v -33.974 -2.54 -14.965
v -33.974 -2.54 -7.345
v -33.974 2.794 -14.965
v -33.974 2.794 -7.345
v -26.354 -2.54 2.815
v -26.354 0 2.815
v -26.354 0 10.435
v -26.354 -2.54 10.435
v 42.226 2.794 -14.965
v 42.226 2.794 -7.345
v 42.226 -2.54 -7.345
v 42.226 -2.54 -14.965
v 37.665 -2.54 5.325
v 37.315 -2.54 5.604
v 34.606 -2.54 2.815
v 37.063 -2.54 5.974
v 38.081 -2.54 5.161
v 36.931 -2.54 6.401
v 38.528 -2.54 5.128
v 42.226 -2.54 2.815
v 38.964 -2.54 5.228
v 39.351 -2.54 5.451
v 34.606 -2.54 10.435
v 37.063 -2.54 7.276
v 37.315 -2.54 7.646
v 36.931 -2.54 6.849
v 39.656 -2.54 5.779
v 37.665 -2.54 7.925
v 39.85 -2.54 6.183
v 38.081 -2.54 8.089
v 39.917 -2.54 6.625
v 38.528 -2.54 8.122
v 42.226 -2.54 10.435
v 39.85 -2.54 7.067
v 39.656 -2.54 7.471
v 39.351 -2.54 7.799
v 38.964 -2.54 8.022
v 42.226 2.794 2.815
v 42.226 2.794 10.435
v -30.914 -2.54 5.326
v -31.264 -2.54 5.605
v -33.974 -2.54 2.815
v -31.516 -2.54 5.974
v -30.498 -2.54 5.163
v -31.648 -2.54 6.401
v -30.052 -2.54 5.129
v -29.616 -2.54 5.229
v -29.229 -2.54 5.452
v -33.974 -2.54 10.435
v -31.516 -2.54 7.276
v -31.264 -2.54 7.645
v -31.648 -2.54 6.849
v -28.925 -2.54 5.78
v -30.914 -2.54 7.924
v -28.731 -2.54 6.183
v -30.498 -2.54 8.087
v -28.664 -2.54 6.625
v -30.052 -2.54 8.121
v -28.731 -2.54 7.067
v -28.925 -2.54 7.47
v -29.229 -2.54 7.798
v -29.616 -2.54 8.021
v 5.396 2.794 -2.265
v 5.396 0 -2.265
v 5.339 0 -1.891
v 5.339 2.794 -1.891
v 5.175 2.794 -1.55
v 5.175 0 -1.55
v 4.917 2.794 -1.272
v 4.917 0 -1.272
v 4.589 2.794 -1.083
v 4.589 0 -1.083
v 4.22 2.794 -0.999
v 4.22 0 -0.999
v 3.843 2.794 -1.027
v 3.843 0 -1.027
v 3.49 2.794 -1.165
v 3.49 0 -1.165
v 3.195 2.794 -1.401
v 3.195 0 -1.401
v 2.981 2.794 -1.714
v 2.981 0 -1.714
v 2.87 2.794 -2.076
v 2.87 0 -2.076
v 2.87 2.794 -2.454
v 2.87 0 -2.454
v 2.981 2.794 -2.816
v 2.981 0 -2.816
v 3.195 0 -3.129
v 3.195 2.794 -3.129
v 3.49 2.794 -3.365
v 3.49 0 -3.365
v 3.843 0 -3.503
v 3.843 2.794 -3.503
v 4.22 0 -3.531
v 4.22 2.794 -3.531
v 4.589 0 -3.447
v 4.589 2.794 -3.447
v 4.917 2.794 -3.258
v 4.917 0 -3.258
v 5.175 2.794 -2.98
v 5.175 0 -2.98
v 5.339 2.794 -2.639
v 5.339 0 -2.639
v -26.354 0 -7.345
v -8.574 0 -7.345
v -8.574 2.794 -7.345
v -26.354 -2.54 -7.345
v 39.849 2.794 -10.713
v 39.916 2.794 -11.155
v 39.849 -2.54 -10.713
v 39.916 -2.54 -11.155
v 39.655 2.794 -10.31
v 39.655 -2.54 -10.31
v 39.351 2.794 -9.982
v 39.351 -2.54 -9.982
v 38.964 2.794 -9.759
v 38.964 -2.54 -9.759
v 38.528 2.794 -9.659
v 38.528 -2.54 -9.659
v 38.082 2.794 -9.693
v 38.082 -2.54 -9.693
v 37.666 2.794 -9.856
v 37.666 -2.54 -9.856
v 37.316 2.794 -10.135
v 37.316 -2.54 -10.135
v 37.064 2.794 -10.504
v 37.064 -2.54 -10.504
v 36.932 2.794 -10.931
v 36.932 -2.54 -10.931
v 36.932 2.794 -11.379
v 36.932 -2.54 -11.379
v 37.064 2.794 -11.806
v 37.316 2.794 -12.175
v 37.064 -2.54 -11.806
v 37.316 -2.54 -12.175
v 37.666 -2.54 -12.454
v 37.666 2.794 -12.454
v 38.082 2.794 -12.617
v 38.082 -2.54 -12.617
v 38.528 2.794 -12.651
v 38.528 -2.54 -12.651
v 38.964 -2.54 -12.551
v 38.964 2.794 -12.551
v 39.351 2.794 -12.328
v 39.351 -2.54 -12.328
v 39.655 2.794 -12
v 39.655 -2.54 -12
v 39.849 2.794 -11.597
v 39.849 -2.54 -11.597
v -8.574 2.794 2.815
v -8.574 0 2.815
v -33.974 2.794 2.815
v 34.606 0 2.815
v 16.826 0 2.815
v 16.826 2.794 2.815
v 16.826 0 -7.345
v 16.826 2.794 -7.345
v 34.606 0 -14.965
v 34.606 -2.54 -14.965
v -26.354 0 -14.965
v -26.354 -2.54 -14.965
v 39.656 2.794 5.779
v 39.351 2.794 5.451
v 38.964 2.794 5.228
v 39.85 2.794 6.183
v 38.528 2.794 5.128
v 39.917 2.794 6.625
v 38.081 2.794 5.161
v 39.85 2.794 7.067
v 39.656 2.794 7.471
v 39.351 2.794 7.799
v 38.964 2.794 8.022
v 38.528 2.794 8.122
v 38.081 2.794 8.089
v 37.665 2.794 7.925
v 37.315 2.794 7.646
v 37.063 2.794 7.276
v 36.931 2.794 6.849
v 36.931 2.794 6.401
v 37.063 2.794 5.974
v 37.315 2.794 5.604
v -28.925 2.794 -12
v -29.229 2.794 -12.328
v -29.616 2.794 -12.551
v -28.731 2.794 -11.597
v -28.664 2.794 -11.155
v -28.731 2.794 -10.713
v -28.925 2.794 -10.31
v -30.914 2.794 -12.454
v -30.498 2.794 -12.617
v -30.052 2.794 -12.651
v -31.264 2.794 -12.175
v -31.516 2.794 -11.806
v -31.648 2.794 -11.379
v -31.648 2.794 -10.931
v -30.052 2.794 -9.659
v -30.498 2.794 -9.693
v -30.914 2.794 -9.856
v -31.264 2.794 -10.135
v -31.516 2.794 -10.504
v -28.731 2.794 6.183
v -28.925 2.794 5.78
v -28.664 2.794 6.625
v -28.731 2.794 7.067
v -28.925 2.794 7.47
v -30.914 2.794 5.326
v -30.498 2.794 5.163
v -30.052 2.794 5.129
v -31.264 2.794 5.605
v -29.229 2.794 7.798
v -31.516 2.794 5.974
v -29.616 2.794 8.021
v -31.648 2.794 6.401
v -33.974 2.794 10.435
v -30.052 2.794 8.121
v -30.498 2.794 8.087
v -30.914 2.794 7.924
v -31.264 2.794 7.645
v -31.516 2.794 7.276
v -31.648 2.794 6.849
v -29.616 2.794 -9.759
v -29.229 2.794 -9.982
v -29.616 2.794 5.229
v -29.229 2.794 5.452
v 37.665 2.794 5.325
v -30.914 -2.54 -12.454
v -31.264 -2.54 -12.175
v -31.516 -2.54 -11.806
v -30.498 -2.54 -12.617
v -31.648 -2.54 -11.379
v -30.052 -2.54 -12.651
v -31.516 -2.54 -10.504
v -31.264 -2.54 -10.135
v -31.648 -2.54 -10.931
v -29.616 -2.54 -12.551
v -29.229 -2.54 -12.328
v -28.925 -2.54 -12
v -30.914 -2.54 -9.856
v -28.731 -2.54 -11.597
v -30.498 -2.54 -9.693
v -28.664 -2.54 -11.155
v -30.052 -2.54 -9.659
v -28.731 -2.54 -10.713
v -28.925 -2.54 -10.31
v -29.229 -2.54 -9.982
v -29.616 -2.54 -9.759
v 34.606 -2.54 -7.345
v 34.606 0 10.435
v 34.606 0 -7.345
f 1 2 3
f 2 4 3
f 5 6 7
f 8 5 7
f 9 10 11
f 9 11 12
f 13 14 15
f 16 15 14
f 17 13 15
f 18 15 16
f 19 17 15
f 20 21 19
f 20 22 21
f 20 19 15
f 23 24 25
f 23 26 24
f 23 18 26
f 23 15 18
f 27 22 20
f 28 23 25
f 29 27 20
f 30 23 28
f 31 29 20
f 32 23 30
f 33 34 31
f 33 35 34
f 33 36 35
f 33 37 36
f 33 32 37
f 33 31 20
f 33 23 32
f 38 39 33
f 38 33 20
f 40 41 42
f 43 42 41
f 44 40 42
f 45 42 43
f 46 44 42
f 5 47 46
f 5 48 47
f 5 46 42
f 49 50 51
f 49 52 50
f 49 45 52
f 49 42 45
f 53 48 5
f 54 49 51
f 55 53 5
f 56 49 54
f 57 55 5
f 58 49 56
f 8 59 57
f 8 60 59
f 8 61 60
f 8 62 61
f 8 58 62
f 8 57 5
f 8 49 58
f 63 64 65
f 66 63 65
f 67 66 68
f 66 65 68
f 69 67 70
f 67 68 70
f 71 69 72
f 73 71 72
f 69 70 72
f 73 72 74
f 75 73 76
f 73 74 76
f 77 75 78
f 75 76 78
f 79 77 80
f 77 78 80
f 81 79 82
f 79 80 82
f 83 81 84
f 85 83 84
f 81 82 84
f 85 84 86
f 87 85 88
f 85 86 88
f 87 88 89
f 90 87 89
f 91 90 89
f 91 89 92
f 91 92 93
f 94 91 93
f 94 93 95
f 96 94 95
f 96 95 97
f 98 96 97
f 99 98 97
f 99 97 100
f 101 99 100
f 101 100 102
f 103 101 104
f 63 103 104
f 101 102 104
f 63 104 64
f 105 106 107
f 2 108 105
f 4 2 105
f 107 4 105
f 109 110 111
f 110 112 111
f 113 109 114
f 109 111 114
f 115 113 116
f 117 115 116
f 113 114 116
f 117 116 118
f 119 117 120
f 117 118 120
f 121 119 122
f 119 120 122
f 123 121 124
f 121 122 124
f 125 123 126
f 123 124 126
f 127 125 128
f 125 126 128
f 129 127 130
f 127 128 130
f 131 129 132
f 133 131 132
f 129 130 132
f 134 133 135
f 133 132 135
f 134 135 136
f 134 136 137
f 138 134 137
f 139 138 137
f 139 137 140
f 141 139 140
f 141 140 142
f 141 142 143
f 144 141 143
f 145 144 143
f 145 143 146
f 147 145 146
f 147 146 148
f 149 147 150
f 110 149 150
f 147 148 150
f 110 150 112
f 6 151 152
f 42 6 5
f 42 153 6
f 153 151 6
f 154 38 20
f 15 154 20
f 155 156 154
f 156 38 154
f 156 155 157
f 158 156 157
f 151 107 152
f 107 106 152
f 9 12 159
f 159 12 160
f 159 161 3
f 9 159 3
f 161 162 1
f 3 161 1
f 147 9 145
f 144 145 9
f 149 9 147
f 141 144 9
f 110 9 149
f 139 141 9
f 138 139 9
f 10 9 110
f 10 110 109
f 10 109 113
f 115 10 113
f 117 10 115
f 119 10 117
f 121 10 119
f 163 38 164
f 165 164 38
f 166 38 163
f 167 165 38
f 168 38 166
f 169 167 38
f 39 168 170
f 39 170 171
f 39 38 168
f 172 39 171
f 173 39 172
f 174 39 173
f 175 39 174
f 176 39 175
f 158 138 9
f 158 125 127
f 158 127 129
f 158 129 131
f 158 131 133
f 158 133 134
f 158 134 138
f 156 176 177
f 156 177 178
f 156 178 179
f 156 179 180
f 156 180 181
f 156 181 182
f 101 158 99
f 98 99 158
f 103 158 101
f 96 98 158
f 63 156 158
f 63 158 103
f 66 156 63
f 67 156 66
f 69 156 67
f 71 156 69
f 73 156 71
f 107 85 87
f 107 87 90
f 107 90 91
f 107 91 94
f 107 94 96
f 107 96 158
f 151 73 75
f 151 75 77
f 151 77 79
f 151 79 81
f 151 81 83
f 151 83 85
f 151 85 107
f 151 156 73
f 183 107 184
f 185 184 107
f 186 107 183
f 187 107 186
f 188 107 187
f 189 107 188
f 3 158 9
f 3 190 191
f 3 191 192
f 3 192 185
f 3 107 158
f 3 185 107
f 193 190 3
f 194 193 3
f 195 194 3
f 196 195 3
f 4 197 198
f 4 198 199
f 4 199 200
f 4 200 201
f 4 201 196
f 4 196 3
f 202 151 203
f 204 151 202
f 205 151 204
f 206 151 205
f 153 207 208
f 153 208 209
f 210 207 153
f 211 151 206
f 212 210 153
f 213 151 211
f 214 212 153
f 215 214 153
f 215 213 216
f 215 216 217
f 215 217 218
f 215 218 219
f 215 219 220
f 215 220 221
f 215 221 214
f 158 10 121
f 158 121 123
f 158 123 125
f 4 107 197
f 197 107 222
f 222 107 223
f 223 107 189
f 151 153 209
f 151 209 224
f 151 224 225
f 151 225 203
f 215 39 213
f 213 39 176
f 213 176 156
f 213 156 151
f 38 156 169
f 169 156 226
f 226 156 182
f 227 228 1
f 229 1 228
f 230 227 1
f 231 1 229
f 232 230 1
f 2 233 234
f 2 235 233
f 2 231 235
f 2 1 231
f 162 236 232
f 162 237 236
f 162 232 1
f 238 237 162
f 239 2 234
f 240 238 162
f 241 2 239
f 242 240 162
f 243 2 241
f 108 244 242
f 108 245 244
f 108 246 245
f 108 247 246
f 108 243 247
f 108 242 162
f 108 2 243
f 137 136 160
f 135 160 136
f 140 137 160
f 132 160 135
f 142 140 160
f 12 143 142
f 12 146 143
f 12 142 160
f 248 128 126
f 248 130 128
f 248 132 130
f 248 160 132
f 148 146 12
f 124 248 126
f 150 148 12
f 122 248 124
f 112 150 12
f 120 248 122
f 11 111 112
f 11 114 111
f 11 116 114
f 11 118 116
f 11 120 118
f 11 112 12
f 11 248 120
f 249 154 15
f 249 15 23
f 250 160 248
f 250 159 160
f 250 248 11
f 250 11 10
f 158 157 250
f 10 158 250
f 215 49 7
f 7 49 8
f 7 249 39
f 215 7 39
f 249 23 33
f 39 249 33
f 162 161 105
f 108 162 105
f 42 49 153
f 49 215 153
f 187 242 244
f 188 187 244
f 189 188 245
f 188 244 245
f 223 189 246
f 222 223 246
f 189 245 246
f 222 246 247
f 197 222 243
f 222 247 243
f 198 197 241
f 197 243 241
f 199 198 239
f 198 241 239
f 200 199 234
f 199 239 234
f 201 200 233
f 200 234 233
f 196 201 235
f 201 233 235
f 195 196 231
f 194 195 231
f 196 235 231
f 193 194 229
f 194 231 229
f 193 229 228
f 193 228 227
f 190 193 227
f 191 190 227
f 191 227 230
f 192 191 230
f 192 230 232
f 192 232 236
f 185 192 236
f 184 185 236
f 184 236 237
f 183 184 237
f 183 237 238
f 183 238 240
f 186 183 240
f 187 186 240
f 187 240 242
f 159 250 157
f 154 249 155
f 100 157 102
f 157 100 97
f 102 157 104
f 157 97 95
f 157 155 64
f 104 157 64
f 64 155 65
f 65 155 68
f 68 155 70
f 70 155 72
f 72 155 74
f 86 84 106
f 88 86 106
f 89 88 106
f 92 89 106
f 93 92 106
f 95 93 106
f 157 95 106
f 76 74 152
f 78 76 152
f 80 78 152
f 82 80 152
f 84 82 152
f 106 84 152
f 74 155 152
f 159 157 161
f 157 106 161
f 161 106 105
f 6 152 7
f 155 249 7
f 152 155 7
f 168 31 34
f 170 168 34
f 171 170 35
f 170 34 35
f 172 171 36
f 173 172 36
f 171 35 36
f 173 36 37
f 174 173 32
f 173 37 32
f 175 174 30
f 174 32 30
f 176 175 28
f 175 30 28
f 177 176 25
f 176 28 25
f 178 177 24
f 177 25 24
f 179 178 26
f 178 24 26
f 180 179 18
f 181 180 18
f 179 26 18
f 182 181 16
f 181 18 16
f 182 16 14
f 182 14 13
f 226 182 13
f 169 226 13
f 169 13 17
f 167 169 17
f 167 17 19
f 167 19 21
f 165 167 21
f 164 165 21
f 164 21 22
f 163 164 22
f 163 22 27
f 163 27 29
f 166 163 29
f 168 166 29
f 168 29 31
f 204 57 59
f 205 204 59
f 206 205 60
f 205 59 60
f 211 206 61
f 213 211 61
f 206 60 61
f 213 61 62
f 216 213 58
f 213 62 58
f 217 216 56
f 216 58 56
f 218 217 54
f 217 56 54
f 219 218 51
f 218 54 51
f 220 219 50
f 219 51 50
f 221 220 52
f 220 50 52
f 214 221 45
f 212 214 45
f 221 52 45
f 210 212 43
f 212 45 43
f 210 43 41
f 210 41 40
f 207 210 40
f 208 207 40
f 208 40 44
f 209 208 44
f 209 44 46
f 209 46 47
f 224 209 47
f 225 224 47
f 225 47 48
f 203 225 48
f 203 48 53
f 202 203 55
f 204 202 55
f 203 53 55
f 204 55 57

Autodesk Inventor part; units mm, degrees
ref_plane "YZ Plane" through (0, 0, 0) normal (1, 0, 0) x (0, 1, 0)
ref_plane "XZ Plane" through (0, 0, 0) normal (0, 1, 0) x (-1, 0, 0)
ref_plane "XY Plane" through (0, 0, 0) normal (0, 0, 1) x (1, 0, 0)
sketch "Sketch1" plane through (0, 0, 0) normal (0, 1, 0) x (-1, 0, 0)
  line L0 (8.5745, -14.965) -> (8.5745, 10.435)
  line L1 (8.5745, 10.435) -> (-16.8255, 10.435)
  line L2 (-16.8255, 10.435) -> (-16.8255, -14.965)
  line L3 (-16.8255, -14.965) -> (8.5745, -14.965)
  point P0 (0, 0)
  dimension "d0" = 25.4
  dimension "d1" = 25.4
extrude "Extrusion1" add sketch "Sketch1" along normal blind 2.794
sketch "Sketch2" plane through (16.8255, 0, 10.435) normal (1, 0, 0) x (0, 0, -1)
  line L0 (25.4, 2.794) -> (0, 2.794) projected
  line L1 (25.4, 0) -> (0, 0) projected
  line L2 (0, 2.794) -> (7.62, 2.794)
  line L3 (7.62, 2.794) -> (7.62, 0)
  line L4 (7.62, 0) -> (0, 0)
  line L5 (0, 0) -> (0, 2.794)
  line L6 (25.4, 0) -> (17.78, 0)
  line L7 (17.78, 0) -> (17.78, 2.794)
  line L8 (17.78, 2.794) -> (25.4, 2.794)
  line L9 (25.4, 2.794) -> (25.4, 0)
  point P0 (10.435, 0)
  dimension "d4" = 7.62
  dimension "d5" = 7.62
extrude "Extrusion2" add sketch "Sketch2" along normal blind 25.4 and the other way blind 50.8 contours L9 L1 L7 L0 | L3 L1 L5 L0
sketch "Sketch3" plane through (0, 0, 0) normal (0, -1, 0) x (1, 0, 0)
  line L0 (16.8255, 2.815) -> (16.8255, -7.345) construction
  line L1 (16.8255, -2.265) -> (-8.5745, -2.265) construction
  line L2 (-8.5745, -7.345) -> (-8.5745, 2.815) construction
  line L3 (42.2255, -14.965) -> (-33.9745, -14.965) construction
  line L4 (4.1255, -14.965) -> (4.1255, 10.435) construction
  line L5 (-33.9745, 10.435) -> (42.2255, 10.435) construction
  circle A0 centre (4.1255, -2.265) radius 1.27
  point P0 (0, 0)
  dimension "d10" = 2.54
extrude "Extrusion3" cut sketch "Sketch3" against normal blind 25.4
sketch "Sketch4" plane through (0, 0, 0) normal (0, -1, 0) x (1, 0, 0)
  line L0 (-33.9745, -14.965) -> (42.2255, -14.965) projected
  line L1 (16.8255, -7.345) -> (42.2255, -7.345) projected
  line L2 (42.2255, -14.965) -> (34.6055, -14.965)
  line L3 (34.6055, -14.965) -> (34.6055, -7.345)
  line L4 (34.6055, -7.345) -> (42.2255, -7.345)
  line L5 (42.2255, -7.345) -> (42.2255, -14.965)
  line L6 (42.2255, 10.435) -> (-33.9745, 10.435) projected
  line L7 (-33.9745, -7.345) -> (-33.9745, -14.965) projected
  line L8 (-33.9745, -7.345) -> (-8.5745, -7.345) projected
  line L9 (-33.9745, -14.965) -> (-26.3545, -14.965)
  line L10 (-26.3545, -14.965) -> (-26.3545, -7.345)
  line L11 (-26.3545, -7.345) -> (-33.9745, -7.345)
  line L12 (-33.9745, -7.345) -> (-33.9745, -14.965)
  line L13 (-33.9745, 10.435) -> (-33.9745, 2.815) projected
  line L14 (-33.9745, 2.815) -> (-26.3545, 2.815)
  line L15 (-26.3545, 2.815) -> (-26.3545, 10.435)
  line L16 (-26.3545, 10.435) -> (-33.9745, 10.435)
  line L17 (-33.9745, 10.435) -> (-33.9745, 2.815)
  line L18 (42.2255, 2.815) -> (42.2255, 10.435) projected
  line L19 (-33.9745, 10.435) -> (42.2255, 10.435) projected
  line L20 (42.2255, 2.815) -> (34.6055, 2.815)
  line L21 (34.6055, 2.815) -> (34.6055, 10.435)
  line L22 (34.6055, 10.435) -> (42.2255, 10.435)
  line L23 (42.2255, 10.435) -> (42.2255, 2.815)
  point P0 (0, 0)
  dimension "d13" = 7.62
  dimension "d14" = 7.62
  dimension "d15" = 7.62
extrude "Extrusion4" add sketch "Sketch4" along normal blind 2.54
sketch "Sketch5" plane through (0, -2.54, 0) normal (0, -1, 0) x (1, 0, 0)
  line L0 (42.2255, -14.965) -> (42.2255, -7.345) projected
  line L1 (34.6055, -14.965) -> (34.6055, -7.345) projected
  line L2 (42.2255, -14.965) -> (34.6055, -14.965)
  line L3 (34.6055, -14.965) -> (34.6055, -7.345)
  line L4 (34.6055, -7.345) -> (42.2255, -7.345)
  line L5 (42.2255, -7.345) -> (42.2255, -14.965)
  circle A0 centre (38.4155, -11.155) radius 1.5
  circle A1 centre (38.4155, 6.625) radius 1.5012
  line L6 (34.6055, 10.435) -> (34.6055, 2.815) projected
  circle A2 centre (-30.1645, 6.625) radius 1.5
  line L7 (-33.9745, 2.815) -> (-26.3545, 2.815) projected
  circle A3 centre (-30.1645, -11.155) radius 1.5
  point P0 (0, 0)
  point P1 (34.6055, 6.625)
  point P2 (-30.1645, 2.815)
  dimension "d18" = 3
  dimension "d19" = 3
  dimension "d20" = 3.0024
  dimension "d21" = 3
extrude "Extrusion5" cut sketch "Sketch5" against normal blind 76.2 contours A0 | A1 | A2 | A3
equation "\"d5\" = d4"
properties part number "Camera Mount"
